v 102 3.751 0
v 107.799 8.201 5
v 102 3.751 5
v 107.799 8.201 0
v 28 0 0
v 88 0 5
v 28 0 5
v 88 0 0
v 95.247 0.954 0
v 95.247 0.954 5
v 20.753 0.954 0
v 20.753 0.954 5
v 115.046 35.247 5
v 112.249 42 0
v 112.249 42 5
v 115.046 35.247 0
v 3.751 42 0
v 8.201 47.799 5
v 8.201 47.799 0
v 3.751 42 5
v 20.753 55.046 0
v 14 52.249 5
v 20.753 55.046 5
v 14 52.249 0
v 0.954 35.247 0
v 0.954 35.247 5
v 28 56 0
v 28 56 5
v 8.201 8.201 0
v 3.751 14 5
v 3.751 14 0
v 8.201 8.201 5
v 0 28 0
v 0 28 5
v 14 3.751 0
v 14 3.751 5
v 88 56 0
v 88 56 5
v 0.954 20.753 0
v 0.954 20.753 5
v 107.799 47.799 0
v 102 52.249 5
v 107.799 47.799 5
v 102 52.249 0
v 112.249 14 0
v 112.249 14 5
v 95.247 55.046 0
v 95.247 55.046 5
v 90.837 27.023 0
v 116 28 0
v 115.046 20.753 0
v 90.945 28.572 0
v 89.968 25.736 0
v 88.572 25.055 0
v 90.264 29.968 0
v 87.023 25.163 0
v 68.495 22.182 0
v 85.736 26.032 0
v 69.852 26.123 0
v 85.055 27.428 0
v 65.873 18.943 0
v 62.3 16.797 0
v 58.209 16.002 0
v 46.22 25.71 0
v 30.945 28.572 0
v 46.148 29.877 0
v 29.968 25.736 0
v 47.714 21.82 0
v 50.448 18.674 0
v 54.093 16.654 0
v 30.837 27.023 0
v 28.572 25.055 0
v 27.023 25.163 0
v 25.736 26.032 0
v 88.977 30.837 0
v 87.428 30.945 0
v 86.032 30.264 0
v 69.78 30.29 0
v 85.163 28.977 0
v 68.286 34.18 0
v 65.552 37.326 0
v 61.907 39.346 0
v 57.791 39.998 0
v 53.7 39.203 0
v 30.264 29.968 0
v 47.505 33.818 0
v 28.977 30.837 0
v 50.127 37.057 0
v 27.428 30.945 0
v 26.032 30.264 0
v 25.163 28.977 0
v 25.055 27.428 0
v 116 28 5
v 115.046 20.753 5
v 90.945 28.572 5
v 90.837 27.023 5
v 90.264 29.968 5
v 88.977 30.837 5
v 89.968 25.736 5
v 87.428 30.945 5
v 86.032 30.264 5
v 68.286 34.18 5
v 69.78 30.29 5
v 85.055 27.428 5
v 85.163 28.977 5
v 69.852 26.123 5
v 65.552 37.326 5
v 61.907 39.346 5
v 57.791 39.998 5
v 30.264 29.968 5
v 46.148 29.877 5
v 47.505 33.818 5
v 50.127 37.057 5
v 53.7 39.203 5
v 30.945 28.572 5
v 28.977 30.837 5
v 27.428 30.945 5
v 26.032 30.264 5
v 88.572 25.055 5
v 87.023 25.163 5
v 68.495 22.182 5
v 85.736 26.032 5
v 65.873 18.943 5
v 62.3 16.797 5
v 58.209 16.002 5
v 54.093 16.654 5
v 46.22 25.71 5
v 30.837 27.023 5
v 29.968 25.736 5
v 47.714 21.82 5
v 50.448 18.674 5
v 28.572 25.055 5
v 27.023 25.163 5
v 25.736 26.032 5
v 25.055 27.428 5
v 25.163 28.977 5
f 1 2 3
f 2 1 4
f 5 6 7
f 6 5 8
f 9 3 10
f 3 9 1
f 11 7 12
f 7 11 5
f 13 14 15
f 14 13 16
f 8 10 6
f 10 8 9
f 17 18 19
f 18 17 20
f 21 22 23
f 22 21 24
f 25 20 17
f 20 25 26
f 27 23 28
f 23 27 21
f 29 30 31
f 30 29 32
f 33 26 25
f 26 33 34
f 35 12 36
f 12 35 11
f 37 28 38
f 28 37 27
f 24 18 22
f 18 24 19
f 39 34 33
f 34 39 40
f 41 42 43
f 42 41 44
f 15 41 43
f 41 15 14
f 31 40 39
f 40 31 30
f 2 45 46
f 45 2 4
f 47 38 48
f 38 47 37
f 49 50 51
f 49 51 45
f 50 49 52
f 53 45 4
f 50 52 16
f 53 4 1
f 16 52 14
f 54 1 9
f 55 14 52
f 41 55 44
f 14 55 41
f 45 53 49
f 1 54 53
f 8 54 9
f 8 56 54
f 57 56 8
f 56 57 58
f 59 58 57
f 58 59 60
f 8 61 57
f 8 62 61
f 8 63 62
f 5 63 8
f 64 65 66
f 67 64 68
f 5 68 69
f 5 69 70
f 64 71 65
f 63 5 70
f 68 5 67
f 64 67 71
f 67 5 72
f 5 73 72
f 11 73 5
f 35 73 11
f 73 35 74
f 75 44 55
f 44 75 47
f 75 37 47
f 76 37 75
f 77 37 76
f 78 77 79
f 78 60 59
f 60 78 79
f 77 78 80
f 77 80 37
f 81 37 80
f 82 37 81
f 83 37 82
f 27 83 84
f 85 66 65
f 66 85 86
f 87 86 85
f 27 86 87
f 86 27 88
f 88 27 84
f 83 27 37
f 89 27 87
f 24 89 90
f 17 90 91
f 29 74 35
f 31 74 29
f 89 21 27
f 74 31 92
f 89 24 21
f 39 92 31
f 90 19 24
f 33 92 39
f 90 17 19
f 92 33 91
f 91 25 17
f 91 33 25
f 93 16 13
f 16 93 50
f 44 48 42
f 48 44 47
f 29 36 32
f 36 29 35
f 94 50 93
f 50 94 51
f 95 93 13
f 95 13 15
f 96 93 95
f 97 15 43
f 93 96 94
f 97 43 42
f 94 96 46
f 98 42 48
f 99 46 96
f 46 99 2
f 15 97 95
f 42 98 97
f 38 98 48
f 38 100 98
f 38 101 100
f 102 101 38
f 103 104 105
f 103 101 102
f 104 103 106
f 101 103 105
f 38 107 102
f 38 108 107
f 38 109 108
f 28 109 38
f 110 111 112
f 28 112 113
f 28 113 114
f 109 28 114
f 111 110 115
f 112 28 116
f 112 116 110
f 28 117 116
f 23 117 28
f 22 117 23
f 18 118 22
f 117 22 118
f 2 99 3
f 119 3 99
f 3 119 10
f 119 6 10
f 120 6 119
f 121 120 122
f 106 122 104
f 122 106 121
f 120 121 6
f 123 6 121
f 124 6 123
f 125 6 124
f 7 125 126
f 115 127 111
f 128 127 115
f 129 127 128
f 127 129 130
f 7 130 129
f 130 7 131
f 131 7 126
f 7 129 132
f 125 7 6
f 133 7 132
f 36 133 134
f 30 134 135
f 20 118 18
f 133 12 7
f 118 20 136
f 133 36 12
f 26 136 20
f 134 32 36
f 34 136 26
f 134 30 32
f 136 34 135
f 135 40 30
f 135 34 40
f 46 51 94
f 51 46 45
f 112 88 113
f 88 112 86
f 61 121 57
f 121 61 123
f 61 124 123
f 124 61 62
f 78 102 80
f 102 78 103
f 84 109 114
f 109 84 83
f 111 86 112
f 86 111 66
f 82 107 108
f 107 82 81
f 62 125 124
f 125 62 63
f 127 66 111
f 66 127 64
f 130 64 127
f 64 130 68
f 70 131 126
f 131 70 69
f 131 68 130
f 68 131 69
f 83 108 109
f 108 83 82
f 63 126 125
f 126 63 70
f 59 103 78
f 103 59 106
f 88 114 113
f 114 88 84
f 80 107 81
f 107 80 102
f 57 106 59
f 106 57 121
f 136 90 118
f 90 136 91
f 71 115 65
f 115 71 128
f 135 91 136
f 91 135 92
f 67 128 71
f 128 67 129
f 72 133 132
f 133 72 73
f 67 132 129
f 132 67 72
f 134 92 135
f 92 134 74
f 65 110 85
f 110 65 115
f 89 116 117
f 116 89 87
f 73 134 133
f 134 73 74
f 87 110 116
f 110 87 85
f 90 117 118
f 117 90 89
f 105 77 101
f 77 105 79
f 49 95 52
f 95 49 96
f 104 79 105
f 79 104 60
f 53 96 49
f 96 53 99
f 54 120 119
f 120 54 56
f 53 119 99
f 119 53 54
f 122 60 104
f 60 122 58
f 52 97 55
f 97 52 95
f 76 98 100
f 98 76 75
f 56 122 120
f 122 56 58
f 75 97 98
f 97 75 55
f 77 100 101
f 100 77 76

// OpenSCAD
$fn = 32;

// ----------------------------------------------------------------------
// Spacer plate: obround span 60, caps R28
// ----------------------------------------------------------------------

// --- parameters (mm) ---
bore_r = 12;              // centre bore radius
bolt_r = 3;               // bolt hole radius
plate_t = 5;              // plate thickness, Z (extrusion height)
span = 60;                // obround span
cap_r = 28;               // cap radius
fit_tol = 0.05;           // declared fit tolerance (prompt contract)
free_tol = 0.3;           // declared free tolerance (prompt contract)

profile = [[28, 56], [20.753, 55.046], [14, 52.249], [8.201, 47.799], [3.751, 42], [0.954, 35.247], [0, 28], [0.954, 20.753], [3.751, 14], [8.201, 8.201], [14, 3.751], [20.753, 0.954], [28, 0], [88, 0], [95.247, 0.954], [102, 3.751], [107.799, 8.201], [112.249, 14], [115.046, 20.753], [116, 28], [115.046, 35.247], [112.249, 42], [107.799, 47.799], [102, 52.249], [95.247, 55.046], [88, 56]];  // primary outline, 26 points, counter clockwise
void_1 = [[69.78, 30.29], [68.286, 34.18], [65.552, 37.326], [61.907, 39.346], [57.791, 39.998], [53.7, 39.203], [50.127, 37.057], [47.505, 33.818], [46.148, 29.877], [46.22, 25.71], [47.714, 21.82], [50.448, 18.674], [54.093, 16.654], [58.209, 16.002], [62.3, 16.797], [65.873, 18.943], [68.495, 22.182], [69.852, 26.123]];  // centre bore, 18 points
void_2 = [[30.945, 28.572], [30.264, 29.968], [28.977, 30.837], [27.428, 30.945], [26.032, 30.264], [25.163, 28.977], [25.055, 27.428], [25.736, 26.032], [27.023, 25.163], [28.572, 25.055], [29.968, 25.736], [30.837, 27.023]];  // end hole, 12 points
void_3 = [[90.945, 28.572], [90.264, 29.968], [88.977, 30.837], [87.428, 30.945], [86.032, 30.264], [85.163, 28.977], [85.055, 27.428], [85.736, 26.032], [87.023, 25.163], [88.572, 25.055], [89.968, 25.736], [90.837, 27.023]];  // end hole, 12 points

// --- the one profile operation ---
difference() {
  linear_extrude(height = plate_t) polygon(points = profile);
  translate([0, 0, -1])
    linear_extrude(height = plate_t + 2) polygon(points = void_1);
  translate([0, 0, -1])
    linear_extrude(height = plate_t + 2) polygon(points = void_2);
  translate([0, 0, -1])
    linear_extrude(height = plate_t + 2) polygon(points = void_3);
}
